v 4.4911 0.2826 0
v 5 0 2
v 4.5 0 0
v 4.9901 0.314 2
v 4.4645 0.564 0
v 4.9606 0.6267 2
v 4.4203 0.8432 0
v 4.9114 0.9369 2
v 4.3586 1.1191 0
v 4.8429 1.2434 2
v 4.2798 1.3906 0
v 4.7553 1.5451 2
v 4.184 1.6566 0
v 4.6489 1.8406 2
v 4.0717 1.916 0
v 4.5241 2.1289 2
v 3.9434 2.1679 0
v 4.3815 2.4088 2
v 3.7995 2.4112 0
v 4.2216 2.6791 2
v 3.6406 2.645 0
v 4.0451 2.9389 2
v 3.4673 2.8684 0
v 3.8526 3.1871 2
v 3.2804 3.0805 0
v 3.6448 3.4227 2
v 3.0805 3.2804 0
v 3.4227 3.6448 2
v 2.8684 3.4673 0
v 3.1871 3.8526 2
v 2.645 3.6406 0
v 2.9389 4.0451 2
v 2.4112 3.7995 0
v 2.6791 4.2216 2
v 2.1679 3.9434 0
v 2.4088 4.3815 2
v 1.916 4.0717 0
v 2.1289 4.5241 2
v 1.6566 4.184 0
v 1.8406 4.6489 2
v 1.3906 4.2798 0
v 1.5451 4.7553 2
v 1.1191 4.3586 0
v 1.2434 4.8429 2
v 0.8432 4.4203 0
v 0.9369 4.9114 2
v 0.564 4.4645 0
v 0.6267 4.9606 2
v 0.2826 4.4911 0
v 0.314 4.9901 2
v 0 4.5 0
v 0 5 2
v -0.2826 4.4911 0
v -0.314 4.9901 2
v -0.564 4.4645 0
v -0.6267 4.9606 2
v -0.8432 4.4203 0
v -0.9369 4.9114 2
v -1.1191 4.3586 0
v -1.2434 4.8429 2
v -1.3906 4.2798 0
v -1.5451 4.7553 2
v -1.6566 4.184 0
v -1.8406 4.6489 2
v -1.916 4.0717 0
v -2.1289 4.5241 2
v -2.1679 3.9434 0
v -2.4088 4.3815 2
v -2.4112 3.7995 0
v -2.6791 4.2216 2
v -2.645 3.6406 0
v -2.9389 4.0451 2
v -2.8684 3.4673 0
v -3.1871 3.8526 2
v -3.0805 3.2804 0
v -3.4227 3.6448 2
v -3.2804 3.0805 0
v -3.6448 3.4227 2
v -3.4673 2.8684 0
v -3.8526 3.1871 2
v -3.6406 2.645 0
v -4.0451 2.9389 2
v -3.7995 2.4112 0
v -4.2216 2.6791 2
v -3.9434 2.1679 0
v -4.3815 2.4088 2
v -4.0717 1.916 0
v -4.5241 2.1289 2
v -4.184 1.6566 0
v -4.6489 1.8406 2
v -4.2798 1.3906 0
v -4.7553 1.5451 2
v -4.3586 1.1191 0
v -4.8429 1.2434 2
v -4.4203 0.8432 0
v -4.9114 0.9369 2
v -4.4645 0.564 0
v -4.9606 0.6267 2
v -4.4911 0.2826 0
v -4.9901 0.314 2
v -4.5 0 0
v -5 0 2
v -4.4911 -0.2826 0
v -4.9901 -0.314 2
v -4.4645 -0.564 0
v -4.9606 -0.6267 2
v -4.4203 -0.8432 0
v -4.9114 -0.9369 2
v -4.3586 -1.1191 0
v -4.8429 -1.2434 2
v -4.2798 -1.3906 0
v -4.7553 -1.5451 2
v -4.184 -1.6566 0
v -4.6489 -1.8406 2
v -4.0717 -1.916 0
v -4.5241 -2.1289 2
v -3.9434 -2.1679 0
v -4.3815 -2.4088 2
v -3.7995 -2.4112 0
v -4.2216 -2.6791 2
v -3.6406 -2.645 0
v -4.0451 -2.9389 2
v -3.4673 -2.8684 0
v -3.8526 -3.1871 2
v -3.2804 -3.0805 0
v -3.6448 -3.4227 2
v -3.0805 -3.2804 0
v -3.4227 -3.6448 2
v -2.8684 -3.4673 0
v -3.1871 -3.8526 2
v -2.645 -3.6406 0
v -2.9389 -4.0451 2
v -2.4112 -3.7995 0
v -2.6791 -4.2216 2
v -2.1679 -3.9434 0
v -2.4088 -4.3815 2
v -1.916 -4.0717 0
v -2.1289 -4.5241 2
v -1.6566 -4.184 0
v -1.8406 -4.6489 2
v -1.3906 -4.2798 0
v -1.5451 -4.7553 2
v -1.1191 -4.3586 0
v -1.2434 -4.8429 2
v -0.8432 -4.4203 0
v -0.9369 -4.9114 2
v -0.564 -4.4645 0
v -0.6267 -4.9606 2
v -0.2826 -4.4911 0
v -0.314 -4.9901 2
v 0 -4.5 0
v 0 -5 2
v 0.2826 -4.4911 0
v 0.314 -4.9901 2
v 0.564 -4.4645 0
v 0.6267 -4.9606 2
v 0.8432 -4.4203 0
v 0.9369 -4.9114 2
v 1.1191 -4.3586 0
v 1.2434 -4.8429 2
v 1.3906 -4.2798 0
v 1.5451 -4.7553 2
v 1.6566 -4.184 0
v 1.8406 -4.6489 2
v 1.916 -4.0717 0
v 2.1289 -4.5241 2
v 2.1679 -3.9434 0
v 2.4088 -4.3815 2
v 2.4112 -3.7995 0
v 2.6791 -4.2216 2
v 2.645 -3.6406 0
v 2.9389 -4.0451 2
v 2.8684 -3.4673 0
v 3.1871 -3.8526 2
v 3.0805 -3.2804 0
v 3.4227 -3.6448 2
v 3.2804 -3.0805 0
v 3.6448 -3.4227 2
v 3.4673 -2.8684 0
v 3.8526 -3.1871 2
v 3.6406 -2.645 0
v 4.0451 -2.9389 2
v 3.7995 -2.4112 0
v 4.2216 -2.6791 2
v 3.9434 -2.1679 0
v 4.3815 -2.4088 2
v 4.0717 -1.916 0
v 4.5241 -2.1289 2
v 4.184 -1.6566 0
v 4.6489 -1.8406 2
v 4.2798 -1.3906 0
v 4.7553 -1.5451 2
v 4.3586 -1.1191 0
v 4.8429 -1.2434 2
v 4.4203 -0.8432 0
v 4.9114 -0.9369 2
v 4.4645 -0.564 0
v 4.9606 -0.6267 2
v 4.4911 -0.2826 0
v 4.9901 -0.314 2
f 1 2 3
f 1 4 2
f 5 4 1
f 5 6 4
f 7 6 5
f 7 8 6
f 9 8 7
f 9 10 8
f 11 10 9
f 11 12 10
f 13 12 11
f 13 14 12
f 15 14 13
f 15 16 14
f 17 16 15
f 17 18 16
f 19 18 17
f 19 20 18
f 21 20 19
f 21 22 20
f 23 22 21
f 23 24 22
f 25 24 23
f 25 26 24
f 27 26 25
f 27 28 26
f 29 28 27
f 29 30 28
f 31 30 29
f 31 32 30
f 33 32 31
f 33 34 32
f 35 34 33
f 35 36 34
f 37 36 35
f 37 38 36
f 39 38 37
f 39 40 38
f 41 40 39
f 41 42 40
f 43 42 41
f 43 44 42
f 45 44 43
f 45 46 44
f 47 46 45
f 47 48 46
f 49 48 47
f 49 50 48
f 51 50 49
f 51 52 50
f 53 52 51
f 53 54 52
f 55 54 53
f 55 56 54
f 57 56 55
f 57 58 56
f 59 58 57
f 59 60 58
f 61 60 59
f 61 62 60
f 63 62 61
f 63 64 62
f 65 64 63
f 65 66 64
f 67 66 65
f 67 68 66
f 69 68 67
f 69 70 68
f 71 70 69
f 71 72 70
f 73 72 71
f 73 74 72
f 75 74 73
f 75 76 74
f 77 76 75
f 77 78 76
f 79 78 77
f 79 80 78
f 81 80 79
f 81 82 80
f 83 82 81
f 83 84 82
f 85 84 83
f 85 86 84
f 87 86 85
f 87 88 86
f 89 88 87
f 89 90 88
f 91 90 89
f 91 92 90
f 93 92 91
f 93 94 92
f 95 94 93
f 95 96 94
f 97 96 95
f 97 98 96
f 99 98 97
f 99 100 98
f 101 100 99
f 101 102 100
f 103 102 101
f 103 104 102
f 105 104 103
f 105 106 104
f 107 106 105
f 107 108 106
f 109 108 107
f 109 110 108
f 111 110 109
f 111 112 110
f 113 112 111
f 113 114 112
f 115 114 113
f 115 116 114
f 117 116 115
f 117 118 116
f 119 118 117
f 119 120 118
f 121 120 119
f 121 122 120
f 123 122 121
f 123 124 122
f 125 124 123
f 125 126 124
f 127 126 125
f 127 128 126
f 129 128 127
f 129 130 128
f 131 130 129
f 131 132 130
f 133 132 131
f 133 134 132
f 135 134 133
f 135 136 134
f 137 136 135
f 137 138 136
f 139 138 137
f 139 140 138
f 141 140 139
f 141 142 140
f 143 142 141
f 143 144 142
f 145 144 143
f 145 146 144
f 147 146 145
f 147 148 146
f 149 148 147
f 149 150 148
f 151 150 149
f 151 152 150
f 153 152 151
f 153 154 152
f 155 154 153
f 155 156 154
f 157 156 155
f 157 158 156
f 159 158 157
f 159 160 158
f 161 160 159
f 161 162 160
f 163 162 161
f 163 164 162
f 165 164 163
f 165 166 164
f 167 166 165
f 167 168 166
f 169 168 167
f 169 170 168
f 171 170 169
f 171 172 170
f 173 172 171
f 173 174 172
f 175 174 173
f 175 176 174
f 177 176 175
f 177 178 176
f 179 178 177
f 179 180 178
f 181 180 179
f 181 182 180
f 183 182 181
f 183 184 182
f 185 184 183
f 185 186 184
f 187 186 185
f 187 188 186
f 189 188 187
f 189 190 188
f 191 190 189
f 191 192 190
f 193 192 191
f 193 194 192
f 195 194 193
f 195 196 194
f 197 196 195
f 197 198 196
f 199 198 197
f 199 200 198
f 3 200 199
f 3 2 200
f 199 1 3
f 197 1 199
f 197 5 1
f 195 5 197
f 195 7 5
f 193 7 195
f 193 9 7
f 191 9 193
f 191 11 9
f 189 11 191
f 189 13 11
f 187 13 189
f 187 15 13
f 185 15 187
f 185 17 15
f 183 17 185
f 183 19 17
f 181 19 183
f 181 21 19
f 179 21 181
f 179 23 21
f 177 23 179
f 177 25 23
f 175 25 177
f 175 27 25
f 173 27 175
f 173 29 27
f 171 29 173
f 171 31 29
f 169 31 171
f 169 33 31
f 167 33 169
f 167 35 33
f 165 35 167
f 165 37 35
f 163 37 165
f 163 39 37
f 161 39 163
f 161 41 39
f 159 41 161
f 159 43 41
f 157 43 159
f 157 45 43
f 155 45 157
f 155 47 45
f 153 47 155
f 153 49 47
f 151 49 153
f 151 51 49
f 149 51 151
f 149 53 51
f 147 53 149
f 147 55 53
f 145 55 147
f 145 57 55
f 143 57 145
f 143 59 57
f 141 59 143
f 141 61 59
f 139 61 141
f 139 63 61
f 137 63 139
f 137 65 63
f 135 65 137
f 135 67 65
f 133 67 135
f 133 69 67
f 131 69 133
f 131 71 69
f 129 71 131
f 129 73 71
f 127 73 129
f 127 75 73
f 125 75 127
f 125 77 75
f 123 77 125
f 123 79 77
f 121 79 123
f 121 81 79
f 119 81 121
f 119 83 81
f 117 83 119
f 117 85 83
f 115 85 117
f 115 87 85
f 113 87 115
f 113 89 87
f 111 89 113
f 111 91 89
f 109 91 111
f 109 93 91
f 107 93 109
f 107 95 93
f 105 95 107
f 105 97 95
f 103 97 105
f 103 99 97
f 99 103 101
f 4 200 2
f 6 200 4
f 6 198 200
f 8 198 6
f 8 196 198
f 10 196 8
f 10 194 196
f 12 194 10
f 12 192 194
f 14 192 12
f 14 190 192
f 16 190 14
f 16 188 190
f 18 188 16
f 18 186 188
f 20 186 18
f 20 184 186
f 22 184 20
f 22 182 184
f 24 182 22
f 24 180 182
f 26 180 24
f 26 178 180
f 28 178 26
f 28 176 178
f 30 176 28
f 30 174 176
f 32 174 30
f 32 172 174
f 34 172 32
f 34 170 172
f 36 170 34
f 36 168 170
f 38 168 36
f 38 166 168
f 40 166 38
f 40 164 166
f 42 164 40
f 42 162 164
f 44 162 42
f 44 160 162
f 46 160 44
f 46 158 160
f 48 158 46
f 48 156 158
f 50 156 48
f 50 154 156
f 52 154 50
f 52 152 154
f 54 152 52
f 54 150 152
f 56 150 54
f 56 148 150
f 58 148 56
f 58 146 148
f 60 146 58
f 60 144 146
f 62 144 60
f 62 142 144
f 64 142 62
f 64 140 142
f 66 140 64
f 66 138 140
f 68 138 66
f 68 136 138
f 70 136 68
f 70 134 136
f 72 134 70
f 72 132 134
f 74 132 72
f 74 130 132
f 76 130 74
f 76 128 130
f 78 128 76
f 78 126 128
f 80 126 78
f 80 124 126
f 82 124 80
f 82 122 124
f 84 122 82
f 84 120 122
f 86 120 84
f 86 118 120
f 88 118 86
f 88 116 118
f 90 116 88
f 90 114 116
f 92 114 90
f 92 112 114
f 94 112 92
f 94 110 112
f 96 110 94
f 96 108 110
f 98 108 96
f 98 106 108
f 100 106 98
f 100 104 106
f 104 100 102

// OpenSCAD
// Generated by Mecha (https://github.com/tomahawkins/mecha)

color([0.5, 0.5, 0.5, 1.0]) cylinder(h = 2.0, r1 = 4.5, r2 = 5.0, center = false, $fn = 100);
